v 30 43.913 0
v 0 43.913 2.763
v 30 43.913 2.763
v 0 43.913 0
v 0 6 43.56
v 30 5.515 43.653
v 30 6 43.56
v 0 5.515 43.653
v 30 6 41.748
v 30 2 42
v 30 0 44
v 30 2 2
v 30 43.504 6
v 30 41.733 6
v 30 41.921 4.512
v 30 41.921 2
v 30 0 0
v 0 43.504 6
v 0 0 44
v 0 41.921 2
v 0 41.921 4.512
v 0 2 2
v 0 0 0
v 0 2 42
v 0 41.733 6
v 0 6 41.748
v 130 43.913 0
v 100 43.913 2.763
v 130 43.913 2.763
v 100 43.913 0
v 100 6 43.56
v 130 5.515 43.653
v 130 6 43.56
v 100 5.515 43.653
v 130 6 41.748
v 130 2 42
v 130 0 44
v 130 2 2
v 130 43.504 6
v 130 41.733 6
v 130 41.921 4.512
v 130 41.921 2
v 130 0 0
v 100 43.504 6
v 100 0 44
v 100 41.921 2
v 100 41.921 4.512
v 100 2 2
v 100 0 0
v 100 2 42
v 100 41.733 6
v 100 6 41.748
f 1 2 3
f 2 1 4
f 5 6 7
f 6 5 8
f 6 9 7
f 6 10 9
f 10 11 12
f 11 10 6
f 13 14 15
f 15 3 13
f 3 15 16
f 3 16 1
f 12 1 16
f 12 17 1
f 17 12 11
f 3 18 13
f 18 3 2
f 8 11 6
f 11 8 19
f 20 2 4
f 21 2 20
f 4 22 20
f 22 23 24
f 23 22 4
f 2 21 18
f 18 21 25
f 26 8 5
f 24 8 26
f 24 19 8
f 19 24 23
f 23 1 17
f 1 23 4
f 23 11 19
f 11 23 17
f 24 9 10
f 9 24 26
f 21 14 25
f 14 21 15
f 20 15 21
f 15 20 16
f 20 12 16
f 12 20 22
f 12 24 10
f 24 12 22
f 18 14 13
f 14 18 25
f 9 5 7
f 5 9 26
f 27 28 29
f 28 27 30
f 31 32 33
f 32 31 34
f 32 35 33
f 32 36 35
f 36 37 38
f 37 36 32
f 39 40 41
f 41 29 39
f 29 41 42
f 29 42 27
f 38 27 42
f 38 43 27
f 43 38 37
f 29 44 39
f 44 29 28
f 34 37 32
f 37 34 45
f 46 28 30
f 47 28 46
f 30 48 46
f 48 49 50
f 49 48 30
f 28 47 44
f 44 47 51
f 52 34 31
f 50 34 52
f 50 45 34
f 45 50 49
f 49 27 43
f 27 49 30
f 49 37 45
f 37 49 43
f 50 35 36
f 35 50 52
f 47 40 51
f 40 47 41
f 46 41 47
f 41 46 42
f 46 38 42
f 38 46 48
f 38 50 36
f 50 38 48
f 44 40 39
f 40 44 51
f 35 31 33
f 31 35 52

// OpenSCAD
$fn=50;

LIGHT_R=40;
DEPTH=2; // print depth of the holder
WIDTH=30; // holder width

OVERLAP=0.01; // how much bigger to make the object we want to remove
              // to ensure it fully removes it

module light_profile(r=LIGHT_R, width=WIDTH) {
   // light profile is a quarter cylinder, we get this by taking a cylinder
   // and intersecting it with a cube
   intersection() {
      rotate([0, 90, 0])
      cylinder(r=r, h=width);
      cube([width, r, r]);
   }
}

module bracket() {
  //the bracket a bigger light profile with a smaller one removed
  difference() {
    light_profile(r=LIGHT_R + DEPTH * 2, width=WIDTH);
    translate([-OVERLAP, DEPTH, DEPTH])
    light_profile(r=LIGHT_R, width=WIDTH + OVERLAP * 2);
    // and remove the front of the bracket with a cube
    translate([-OVERLAP, DEPTH * 3, DEPTH * 3])
    cube([WIDTH + OVERLAP * 2, LIGHT_R, LIGHT_R]);
  }
}


bracket(); // first bracket

translate([100, 0, 0])
bracket(); // second bracket
